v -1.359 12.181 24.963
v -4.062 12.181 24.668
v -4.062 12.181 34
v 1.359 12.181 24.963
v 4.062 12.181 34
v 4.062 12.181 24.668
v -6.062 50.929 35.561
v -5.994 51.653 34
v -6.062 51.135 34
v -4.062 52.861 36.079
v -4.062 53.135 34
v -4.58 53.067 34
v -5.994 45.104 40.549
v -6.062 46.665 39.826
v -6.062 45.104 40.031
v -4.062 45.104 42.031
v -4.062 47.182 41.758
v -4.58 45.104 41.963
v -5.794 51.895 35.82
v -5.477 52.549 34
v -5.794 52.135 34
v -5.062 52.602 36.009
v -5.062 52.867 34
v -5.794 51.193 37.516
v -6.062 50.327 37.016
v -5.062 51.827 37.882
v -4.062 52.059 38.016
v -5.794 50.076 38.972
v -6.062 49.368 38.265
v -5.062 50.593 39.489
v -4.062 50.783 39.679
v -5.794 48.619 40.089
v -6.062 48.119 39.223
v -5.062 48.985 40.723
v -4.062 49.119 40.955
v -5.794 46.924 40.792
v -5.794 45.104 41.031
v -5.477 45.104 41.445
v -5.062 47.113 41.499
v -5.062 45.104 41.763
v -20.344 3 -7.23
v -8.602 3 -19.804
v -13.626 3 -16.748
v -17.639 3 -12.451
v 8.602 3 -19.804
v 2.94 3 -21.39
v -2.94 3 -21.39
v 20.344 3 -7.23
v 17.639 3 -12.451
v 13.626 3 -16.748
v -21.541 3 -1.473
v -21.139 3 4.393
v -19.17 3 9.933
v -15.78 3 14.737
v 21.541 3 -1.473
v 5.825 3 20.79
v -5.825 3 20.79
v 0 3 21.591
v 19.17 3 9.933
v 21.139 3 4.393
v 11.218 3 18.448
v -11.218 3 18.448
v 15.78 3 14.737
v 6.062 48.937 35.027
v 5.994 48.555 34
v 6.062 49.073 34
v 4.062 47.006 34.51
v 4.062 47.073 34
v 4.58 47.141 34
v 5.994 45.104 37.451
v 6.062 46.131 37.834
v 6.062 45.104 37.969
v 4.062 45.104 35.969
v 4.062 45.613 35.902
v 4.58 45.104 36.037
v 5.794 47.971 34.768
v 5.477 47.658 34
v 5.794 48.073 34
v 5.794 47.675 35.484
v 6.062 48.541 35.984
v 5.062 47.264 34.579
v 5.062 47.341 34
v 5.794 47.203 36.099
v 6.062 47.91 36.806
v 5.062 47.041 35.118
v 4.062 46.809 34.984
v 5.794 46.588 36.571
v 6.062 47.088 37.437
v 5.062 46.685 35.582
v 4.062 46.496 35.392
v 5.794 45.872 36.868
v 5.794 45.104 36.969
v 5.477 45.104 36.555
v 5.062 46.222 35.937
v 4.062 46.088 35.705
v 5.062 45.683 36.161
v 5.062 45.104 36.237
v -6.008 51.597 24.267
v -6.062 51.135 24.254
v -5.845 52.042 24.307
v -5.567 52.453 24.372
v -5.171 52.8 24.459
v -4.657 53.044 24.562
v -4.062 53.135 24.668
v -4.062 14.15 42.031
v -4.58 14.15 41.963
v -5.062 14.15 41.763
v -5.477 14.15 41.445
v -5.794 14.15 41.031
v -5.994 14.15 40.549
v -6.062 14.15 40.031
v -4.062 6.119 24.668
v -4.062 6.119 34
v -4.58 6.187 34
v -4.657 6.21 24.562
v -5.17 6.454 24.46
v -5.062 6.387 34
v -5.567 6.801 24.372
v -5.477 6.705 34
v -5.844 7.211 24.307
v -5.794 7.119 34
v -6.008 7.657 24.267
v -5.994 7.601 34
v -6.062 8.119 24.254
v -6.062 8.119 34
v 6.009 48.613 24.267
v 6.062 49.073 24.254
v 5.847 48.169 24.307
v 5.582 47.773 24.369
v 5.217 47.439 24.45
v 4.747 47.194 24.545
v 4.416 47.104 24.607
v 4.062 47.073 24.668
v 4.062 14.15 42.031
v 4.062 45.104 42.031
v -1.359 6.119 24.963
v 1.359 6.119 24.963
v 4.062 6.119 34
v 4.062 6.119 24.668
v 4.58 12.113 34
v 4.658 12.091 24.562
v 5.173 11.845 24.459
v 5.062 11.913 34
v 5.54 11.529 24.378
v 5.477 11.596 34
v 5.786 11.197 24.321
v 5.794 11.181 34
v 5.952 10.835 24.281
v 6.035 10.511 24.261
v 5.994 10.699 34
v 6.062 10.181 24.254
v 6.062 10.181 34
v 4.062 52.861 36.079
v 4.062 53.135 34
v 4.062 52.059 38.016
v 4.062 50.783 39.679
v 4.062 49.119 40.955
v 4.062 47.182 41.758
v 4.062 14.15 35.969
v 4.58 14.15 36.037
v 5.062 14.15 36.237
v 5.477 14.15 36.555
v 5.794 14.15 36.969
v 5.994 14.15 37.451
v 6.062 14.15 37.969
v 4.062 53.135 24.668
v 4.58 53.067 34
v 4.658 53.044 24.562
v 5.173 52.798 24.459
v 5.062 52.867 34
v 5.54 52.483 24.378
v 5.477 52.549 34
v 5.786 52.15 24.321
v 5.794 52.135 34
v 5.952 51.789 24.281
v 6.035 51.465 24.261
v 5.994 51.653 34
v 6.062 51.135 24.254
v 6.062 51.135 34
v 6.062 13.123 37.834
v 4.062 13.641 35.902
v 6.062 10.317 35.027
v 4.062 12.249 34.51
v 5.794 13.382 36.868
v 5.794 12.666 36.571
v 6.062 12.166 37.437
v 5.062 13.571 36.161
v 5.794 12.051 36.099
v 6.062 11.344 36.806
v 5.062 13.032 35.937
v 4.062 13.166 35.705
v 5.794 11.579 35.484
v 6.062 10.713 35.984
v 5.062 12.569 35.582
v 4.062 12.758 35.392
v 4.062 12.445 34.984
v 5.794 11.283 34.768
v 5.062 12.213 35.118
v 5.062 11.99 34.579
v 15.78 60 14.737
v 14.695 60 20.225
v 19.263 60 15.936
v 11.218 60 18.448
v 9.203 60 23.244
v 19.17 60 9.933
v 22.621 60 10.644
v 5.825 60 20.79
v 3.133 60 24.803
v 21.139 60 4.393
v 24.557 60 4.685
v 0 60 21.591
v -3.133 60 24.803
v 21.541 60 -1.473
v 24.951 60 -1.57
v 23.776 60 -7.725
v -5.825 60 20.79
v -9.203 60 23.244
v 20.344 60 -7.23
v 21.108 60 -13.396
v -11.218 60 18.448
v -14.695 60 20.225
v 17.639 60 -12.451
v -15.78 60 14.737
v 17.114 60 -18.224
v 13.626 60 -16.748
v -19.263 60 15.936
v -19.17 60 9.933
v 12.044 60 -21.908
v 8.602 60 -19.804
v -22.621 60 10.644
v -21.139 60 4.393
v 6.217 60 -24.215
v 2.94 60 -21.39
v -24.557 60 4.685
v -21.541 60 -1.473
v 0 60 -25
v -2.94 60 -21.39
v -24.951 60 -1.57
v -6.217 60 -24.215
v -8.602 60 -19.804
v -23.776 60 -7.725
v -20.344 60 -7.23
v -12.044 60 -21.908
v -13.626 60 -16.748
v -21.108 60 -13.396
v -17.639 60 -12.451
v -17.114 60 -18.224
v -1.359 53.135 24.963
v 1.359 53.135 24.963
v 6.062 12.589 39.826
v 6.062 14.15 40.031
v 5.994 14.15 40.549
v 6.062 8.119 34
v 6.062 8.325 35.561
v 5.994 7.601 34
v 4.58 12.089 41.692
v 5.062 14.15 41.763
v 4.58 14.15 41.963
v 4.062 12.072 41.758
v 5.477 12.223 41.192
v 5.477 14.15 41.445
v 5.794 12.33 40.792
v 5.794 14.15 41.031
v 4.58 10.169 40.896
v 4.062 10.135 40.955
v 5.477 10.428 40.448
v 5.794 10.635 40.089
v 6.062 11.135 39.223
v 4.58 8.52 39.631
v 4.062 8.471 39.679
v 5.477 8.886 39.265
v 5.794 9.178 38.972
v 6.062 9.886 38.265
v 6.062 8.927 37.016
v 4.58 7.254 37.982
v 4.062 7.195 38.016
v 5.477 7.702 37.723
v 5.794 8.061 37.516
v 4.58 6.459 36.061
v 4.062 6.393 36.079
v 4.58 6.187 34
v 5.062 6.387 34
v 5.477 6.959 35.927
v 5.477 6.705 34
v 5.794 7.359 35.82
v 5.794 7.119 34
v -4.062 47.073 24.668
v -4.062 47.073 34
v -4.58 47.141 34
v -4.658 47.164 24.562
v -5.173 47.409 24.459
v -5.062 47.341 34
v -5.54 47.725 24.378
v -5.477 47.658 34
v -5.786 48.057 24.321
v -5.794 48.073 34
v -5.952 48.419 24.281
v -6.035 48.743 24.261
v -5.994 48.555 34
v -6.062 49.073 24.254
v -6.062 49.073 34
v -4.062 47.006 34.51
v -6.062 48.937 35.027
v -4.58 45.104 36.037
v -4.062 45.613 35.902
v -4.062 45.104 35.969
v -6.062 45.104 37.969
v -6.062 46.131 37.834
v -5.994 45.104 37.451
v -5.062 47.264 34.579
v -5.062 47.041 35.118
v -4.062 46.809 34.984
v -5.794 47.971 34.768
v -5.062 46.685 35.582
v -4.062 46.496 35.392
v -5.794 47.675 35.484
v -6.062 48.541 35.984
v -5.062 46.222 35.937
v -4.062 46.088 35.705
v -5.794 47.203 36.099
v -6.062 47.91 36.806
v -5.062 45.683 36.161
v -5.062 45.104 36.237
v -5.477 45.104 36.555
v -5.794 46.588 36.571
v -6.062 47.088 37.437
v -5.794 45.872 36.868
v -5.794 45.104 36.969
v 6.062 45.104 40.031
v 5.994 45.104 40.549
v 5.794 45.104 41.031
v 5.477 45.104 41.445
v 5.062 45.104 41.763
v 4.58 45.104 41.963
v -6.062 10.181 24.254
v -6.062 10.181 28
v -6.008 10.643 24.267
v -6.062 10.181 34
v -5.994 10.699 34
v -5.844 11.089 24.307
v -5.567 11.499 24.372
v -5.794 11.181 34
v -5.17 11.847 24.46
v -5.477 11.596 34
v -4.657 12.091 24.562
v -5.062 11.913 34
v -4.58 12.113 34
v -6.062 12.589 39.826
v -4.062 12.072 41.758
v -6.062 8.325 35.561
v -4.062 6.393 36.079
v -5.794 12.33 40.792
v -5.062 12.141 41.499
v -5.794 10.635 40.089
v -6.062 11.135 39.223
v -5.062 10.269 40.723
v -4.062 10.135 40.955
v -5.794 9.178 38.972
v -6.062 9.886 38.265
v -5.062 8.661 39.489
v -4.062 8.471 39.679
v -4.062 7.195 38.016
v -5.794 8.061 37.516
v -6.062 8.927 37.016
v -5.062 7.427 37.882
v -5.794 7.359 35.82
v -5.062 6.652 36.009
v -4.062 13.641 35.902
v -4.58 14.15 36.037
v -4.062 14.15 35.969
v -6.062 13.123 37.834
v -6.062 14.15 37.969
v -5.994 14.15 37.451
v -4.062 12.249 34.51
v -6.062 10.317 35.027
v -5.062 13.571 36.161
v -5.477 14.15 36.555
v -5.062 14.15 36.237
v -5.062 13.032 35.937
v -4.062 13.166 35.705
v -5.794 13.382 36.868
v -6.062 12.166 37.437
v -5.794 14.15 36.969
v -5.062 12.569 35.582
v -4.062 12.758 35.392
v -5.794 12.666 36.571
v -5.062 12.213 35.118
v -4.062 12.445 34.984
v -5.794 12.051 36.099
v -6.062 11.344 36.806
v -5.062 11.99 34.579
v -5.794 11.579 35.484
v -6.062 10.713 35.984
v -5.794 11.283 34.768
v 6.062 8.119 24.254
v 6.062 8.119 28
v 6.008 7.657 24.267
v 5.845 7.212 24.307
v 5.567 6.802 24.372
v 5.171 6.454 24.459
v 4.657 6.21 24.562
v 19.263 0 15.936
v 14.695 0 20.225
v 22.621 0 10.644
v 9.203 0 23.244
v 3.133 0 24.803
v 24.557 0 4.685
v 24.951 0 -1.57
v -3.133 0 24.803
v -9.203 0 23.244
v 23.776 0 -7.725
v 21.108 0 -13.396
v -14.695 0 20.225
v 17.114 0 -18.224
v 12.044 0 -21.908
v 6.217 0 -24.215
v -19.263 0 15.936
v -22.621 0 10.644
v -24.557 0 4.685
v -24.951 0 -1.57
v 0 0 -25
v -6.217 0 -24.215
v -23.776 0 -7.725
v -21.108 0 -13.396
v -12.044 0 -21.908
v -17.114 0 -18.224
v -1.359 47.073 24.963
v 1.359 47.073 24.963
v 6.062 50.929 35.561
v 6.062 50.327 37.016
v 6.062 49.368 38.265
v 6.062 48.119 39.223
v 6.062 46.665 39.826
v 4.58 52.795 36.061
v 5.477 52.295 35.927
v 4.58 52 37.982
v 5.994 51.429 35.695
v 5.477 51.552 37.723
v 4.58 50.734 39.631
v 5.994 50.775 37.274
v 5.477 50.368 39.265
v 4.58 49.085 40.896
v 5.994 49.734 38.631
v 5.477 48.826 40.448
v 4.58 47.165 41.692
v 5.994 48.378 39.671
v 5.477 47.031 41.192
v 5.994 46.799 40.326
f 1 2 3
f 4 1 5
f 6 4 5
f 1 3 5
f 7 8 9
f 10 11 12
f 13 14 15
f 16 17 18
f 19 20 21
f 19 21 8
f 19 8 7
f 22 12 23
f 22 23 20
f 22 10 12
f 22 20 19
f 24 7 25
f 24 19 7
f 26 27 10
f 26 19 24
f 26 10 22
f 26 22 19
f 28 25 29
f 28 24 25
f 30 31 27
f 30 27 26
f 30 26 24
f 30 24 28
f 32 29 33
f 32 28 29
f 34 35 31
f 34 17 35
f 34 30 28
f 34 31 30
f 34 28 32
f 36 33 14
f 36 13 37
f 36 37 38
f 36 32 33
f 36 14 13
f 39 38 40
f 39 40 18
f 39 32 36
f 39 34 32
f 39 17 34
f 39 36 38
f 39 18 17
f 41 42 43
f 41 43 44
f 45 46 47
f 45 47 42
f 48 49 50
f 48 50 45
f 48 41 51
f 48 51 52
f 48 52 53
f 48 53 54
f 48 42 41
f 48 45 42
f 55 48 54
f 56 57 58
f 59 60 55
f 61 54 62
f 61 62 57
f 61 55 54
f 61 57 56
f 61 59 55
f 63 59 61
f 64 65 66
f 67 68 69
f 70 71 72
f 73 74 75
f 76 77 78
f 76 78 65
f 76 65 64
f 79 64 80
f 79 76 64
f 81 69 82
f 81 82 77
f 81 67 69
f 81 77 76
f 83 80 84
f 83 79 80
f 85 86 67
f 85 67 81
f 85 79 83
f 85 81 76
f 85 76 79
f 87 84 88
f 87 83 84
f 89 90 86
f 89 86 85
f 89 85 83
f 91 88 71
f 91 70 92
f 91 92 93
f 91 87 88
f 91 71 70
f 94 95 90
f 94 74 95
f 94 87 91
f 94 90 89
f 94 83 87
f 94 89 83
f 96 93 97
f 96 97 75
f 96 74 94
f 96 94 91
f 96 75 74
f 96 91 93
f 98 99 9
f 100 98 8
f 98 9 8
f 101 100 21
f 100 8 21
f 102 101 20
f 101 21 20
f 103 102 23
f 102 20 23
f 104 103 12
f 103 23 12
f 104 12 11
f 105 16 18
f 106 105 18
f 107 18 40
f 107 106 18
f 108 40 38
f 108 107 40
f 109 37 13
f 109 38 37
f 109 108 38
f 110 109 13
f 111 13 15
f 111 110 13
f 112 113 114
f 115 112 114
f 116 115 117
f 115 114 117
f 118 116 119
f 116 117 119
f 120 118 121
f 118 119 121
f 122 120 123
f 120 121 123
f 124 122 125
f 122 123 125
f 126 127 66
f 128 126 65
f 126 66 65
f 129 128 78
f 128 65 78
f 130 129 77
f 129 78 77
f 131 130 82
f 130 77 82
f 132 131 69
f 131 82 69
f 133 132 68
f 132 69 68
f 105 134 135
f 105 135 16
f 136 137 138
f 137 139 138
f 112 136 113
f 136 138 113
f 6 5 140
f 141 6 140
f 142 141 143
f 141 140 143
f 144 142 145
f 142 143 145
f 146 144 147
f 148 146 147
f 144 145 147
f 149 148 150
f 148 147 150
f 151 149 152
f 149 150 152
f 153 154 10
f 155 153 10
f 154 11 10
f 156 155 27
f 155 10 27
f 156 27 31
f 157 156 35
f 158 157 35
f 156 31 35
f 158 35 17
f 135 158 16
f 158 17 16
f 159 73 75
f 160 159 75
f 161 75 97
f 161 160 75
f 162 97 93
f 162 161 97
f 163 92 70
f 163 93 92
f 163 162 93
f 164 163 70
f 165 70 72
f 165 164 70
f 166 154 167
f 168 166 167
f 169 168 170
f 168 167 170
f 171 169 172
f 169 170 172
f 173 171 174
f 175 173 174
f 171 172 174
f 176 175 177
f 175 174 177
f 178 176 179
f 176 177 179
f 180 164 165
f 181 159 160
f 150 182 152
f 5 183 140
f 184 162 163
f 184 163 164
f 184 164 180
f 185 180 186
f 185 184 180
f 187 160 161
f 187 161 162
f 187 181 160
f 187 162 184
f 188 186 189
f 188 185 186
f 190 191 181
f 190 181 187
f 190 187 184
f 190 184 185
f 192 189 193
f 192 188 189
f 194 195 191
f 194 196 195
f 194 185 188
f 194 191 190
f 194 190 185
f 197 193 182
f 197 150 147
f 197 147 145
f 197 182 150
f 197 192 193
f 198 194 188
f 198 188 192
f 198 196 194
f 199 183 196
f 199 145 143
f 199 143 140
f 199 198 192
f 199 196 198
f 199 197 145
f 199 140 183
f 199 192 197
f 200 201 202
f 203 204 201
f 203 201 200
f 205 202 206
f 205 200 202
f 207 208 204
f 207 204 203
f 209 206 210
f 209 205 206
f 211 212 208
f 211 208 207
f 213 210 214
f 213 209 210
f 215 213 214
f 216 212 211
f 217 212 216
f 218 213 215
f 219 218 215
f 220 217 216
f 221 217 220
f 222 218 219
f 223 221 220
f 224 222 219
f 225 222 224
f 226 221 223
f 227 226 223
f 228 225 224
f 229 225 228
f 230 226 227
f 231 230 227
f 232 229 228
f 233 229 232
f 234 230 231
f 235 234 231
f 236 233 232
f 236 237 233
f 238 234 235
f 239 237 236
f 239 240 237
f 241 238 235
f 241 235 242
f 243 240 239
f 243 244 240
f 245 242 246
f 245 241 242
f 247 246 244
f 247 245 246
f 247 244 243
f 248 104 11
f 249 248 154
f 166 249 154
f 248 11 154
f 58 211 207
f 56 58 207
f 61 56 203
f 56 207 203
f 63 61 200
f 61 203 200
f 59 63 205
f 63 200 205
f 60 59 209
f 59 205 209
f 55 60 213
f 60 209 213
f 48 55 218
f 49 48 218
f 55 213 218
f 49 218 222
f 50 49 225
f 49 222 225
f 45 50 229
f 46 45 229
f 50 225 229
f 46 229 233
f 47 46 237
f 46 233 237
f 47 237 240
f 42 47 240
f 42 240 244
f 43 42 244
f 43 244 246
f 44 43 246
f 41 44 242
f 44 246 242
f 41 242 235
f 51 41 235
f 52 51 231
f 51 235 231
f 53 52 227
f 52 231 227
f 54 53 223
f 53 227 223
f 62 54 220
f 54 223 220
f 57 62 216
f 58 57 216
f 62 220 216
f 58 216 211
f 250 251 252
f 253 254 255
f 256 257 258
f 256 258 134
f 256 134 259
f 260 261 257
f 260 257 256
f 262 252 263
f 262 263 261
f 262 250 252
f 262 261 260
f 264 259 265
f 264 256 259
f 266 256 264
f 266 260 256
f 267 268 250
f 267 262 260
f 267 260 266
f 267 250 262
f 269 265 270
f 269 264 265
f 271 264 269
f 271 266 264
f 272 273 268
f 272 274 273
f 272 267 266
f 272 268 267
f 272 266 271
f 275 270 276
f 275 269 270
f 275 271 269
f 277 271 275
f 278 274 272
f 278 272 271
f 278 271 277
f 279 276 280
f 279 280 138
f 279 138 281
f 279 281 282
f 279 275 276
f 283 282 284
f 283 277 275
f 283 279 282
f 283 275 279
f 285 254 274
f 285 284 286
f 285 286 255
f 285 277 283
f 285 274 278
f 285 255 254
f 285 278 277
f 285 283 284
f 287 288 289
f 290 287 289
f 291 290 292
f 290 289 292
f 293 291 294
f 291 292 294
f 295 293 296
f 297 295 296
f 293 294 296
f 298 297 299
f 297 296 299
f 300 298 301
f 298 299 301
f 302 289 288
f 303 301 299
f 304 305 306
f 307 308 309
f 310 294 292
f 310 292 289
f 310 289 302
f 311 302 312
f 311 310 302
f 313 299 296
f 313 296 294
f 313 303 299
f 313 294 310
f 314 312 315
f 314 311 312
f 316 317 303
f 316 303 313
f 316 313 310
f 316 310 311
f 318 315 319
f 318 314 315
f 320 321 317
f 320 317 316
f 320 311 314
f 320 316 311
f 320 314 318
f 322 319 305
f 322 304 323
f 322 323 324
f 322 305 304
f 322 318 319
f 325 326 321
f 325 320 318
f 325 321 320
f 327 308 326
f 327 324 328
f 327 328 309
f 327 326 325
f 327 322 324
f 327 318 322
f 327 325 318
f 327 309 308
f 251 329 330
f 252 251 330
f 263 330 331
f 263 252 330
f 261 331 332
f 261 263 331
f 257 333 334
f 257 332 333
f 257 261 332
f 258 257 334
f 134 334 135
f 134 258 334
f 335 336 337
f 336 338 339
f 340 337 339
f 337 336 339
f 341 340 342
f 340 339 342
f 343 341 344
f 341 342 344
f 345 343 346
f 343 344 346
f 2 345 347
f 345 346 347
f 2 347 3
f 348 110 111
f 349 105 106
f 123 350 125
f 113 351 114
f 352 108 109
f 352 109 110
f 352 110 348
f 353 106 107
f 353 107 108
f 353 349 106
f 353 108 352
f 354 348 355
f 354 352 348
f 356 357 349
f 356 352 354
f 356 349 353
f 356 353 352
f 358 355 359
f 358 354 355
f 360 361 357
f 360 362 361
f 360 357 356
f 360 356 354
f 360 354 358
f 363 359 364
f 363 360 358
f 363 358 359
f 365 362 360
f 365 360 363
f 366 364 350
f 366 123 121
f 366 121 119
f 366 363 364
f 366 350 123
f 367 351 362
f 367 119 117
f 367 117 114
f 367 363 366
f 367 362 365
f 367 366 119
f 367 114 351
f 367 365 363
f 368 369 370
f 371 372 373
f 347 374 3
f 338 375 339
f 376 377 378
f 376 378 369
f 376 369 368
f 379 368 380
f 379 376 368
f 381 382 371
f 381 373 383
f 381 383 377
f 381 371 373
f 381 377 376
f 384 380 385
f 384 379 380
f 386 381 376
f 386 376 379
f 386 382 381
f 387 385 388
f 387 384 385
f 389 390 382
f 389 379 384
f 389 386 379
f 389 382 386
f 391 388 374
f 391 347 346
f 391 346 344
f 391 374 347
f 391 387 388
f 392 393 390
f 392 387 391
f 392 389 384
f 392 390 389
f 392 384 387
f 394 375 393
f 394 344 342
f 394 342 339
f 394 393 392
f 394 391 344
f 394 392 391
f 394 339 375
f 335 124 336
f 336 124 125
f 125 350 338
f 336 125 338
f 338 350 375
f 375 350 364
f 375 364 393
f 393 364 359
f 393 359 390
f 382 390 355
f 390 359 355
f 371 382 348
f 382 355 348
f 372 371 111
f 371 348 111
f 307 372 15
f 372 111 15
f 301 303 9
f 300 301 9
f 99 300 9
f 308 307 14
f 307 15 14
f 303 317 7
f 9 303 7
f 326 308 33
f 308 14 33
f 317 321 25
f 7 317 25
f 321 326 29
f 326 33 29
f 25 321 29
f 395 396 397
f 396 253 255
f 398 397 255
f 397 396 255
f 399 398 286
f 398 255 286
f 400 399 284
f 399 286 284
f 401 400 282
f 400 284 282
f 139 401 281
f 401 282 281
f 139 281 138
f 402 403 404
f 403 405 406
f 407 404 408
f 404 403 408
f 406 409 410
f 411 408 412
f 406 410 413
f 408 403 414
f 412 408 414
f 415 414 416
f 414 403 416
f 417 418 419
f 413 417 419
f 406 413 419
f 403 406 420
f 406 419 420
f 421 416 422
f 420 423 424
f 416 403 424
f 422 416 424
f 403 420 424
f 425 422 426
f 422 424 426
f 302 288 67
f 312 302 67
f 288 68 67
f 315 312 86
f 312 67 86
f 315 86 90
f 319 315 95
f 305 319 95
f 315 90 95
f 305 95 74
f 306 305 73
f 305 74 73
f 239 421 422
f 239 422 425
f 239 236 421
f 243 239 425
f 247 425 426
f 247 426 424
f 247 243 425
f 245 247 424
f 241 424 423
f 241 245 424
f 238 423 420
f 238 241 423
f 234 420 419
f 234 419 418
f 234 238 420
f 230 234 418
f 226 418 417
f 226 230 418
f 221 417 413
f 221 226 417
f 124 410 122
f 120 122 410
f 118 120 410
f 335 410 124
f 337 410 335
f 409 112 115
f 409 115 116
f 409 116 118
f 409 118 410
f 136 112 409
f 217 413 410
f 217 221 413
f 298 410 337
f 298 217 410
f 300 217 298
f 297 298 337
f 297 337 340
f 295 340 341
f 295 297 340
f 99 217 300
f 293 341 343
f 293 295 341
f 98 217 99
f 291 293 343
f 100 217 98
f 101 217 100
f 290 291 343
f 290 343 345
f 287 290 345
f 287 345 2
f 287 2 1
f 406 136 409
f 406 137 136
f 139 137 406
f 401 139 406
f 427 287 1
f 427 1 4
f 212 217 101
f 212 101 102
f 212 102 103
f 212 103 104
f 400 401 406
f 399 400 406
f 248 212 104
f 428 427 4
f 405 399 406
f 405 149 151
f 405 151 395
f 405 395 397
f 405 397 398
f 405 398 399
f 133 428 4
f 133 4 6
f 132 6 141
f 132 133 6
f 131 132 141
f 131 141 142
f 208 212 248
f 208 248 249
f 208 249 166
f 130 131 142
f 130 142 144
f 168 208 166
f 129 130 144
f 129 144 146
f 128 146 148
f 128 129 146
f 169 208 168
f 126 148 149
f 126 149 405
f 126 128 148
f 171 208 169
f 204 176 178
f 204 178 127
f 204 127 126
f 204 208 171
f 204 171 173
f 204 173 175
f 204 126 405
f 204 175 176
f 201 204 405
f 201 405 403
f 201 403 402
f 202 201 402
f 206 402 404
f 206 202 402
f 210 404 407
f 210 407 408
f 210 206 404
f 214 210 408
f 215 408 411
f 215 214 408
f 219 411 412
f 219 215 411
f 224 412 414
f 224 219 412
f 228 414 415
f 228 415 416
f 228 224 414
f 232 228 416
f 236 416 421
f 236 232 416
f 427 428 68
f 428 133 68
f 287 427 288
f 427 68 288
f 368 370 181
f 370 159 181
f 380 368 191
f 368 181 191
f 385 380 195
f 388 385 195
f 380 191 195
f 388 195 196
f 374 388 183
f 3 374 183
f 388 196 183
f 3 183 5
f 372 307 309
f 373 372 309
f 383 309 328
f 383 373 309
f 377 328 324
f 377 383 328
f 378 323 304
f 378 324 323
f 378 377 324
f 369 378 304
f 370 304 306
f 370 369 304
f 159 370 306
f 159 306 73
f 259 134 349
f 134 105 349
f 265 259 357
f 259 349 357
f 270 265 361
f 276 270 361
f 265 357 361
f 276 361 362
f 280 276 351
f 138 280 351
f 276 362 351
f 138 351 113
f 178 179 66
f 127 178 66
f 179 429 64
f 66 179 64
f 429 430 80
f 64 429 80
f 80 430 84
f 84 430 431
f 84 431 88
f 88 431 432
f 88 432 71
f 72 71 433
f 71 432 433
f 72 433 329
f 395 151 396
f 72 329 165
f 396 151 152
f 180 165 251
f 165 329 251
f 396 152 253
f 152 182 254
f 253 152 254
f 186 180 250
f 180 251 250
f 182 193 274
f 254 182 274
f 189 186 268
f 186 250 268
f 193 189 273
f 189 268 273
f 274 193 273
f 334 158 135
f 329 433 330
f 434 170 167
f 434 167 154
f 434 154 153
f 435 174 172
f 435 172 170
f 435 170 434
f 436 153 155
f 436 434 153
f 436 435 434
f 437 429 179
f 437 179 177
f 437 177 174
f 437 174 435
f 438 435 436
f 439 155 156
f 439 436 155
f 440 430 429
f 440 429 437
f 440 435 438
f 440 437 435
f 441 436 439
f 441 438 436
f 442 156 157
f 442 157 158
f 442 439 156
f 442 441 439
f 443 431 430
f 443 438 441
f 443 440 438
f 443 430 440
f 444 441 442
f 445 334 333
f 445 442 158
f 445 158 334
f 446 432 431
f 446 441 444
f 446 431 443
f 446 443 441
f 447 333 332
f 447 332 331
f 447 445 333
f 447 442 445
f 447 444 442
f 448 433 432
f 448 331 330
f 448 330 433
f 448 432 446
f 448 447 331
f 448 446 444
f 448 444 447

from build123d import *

# Parameters (mm, degrees)
ESBO_O2_W                = 25
ESBO_O2_H                = 60
ESBO_O3_R                = 21.591040813
CORTE_EXTRUS_O1_DEPTH    = 57
RESSALTO_EXTRUS_O1_REACH = 85.869


with BuildPart() as part:
    # Esboço2 → Revolução1 (revolve)
    with BuildSketch(Plane(origin=(0, 0, 0), x_dir=(0, 0, -1), z_dir=(1, 0, 0)), mode=Mode.PRIVATE) as revolu_o1_sk:
        with Locations((-12.5, 30)):
            Rectangle(ESBO_O2_W, ESBO_O2_H)
    revolve(revolu_o1_sk.sketch.rotate(Axis((0, 0, 0), (0, 1, 0)), 180), axis=Axis((0, 0, 0), (0, 1, 0)))

    # Esboço3 → Corte-extrusão1 (cut)
    with BuildSketch(Plane(origin=(0, 60, 0), x_dir=(1, 0, 0), z_dir=(0, 1, 0))):
        with Locations(Location((0, 0, 0), (0, 0, 270))):
            Circle(ESBO_O3_R)
    extrude(amount=-CORTE_EXTRUS_O1_DEPTH, mode=Mode.SUBTRACT)

    # Esboço6 → Ressalto-extrusão1 (add, up to next)
    with BuildSketch(Plane(origin=(0, 0, 28), x_dir=(-1, 0, 0), z_dir=(0, 0, -1)), mode=Mode.PRIVATE) as ressalto_extrus_o1_sk1:
        with BuildLine():
            Line((4.062337727, 53.13495059), (-4.062337727, 53.13495059))
            ThreePointArc((-4.062337727, 53.13495059), (-5.476551289, 52.549164152), (-6.062337727, 51.13495059))
            Line((-6.062337727, 51.13495059), (-6.062337727, 49.072612863))
            ThreePointArc((-6.062337727, 49.072612863), (-5.476551289, 47.658399301), (-4.062337727, 47.072612863))
            Line((-4.062337727, 47.072612863), (4.062337727, 47.072612863))
            ThreePointArc((4.062337727, 47.072612863), (5.476551289, 47.658399301), (6.062337727, 49.072612863))
            Line((6.062337727, 49.072612863), (6.062337727, 51.13495059))
            ThreePointArc((6.062337727, 51.13495059), (5.476551289, 52.549164152), (4.062337727, 53.13495059))
        make_face()
    ressalto_extrus_o1_tool1 = extrude(ressalto_extrus_o1_sk1.sketch, amount=RESSALTO_EXTRUS_O1_REACH, mode=Mode.PRIVATE) - part.part
    # Esboço6 → Ressalto-extrusão1 (add, up to next)
    with BuildSketch(Plane(origin=(0, 0, 28), x_dir=(-1, 0, 0), z_dir=(0, 0, -1)), mode=Mode.PRIVATE) as ressalto_extrus_o1_sk2:
        with BuildLine():
            Line((6.062337727, 8.119097581), (6.062337727, 10.181435308))
            ThreePointArc((6.062337727, 10.181435308), (5.476551289, 11.59564887), (4.062337727, 12.181435308))
            Line((4.062337727, 12.181435308), (-4.062337727, 12.181435308))
            ThreePointArc((-4.062337727, 12.181435308), (-5.476551289, 11.59564887), (-6.062337727, 10.181435308))
            Line((-6.062337727, 10.181435308), (-6.062337727, 8.119097581))
            ThreePointArc((-6.062337727, 8.119097581), (-5.476551289, 6.704884018), (-4.062337727, 6.119097581))
            Line((-4.062337727, 6.119097581), (4.062337727, 6.119097581))
            ThreePointArc((4.062337727, 6.119097581), (5.476551289, 6.704884018), (6.062337727, 8.119097581))
        make_face()
    ressalto_extrus_o1_tool2 = extrude(ressalto_extrus_o1_sk2.sketch, amount=RESSALTO_EXTRUS_O1_REACH, mode=Mode.PRIVATE) - part.part


with BuildPart() as body_2:
    # Varredura1: sweep along a path in Esboço5
    with BuildLine(Plane(origin=(0, 0, 0), x_dir=(0, 0, -1), z_dir=(1, 0, 0))) as varredura1_path:
        Line((-28, 50.103781727), (-34, 50.103781727))
        ThreePointArc((-34, 50.103781727), (-37.535533906, 48.639315633), (-39, 45.103781727))
        Line((-39, 45.103781727), (-39, 14.150266444))
        ThreePointArc((-39, 14.150266444), (-37.535533906, 10.614732538), (-34, 9.150266444))
        Line((-34, 9.150266444), (-28, 9.150266444))
    # Esboço4 → Varredura1 (sweep)
    with BuildSketch(Plane.XY.offset(28)):
        with BuildLine():
            Line((-4.062337727, 53.13495059), (4.062337727, 53.13495059))
            ThreePointArc((4.062337727, 53.13495059), (5.476551289, 52.549164152), (6.062337727, 51.13495059))
            Line((6.062337727, 51.13495059), (6.062337727, 49.072612863))
            ThreePointArc((6.062337727, 49.072612863), (5.476551289, 47.658399301), (4.062337727, 47.072612863))
            Line((4.062337727, 47.072612863), (-4.062337727, 47.072612863))
            ThreePointArc((-4.062337727, 47.072612863), (-5.476551289, 47.658399301), (-6.062337727, 49.072612863))
            Line((-6.062337727, 49.072612863), (-6.062337727, 51.13495059))
            ThreePointArc((-6.062337727, 51.13495059), (-5.476551289, 52.549164152), (-4.062337727, 53.13495059))
        make_face()
    sweep(path=varredura1_path.line)


with BuildPart() as part_1:
    add(part.part)

    add(body_2.part)  # Ressalto-extrusão1 merges body 2
    add(ressalto_extrus_o1_tool1.solids().sort_by_distance((0, 50.103782, 28))[0])
    add(ressalto_extrus_o1_tool2.solids().sort_by_distance((0, 9.150266, 28))[0])


solid = part_1.part
